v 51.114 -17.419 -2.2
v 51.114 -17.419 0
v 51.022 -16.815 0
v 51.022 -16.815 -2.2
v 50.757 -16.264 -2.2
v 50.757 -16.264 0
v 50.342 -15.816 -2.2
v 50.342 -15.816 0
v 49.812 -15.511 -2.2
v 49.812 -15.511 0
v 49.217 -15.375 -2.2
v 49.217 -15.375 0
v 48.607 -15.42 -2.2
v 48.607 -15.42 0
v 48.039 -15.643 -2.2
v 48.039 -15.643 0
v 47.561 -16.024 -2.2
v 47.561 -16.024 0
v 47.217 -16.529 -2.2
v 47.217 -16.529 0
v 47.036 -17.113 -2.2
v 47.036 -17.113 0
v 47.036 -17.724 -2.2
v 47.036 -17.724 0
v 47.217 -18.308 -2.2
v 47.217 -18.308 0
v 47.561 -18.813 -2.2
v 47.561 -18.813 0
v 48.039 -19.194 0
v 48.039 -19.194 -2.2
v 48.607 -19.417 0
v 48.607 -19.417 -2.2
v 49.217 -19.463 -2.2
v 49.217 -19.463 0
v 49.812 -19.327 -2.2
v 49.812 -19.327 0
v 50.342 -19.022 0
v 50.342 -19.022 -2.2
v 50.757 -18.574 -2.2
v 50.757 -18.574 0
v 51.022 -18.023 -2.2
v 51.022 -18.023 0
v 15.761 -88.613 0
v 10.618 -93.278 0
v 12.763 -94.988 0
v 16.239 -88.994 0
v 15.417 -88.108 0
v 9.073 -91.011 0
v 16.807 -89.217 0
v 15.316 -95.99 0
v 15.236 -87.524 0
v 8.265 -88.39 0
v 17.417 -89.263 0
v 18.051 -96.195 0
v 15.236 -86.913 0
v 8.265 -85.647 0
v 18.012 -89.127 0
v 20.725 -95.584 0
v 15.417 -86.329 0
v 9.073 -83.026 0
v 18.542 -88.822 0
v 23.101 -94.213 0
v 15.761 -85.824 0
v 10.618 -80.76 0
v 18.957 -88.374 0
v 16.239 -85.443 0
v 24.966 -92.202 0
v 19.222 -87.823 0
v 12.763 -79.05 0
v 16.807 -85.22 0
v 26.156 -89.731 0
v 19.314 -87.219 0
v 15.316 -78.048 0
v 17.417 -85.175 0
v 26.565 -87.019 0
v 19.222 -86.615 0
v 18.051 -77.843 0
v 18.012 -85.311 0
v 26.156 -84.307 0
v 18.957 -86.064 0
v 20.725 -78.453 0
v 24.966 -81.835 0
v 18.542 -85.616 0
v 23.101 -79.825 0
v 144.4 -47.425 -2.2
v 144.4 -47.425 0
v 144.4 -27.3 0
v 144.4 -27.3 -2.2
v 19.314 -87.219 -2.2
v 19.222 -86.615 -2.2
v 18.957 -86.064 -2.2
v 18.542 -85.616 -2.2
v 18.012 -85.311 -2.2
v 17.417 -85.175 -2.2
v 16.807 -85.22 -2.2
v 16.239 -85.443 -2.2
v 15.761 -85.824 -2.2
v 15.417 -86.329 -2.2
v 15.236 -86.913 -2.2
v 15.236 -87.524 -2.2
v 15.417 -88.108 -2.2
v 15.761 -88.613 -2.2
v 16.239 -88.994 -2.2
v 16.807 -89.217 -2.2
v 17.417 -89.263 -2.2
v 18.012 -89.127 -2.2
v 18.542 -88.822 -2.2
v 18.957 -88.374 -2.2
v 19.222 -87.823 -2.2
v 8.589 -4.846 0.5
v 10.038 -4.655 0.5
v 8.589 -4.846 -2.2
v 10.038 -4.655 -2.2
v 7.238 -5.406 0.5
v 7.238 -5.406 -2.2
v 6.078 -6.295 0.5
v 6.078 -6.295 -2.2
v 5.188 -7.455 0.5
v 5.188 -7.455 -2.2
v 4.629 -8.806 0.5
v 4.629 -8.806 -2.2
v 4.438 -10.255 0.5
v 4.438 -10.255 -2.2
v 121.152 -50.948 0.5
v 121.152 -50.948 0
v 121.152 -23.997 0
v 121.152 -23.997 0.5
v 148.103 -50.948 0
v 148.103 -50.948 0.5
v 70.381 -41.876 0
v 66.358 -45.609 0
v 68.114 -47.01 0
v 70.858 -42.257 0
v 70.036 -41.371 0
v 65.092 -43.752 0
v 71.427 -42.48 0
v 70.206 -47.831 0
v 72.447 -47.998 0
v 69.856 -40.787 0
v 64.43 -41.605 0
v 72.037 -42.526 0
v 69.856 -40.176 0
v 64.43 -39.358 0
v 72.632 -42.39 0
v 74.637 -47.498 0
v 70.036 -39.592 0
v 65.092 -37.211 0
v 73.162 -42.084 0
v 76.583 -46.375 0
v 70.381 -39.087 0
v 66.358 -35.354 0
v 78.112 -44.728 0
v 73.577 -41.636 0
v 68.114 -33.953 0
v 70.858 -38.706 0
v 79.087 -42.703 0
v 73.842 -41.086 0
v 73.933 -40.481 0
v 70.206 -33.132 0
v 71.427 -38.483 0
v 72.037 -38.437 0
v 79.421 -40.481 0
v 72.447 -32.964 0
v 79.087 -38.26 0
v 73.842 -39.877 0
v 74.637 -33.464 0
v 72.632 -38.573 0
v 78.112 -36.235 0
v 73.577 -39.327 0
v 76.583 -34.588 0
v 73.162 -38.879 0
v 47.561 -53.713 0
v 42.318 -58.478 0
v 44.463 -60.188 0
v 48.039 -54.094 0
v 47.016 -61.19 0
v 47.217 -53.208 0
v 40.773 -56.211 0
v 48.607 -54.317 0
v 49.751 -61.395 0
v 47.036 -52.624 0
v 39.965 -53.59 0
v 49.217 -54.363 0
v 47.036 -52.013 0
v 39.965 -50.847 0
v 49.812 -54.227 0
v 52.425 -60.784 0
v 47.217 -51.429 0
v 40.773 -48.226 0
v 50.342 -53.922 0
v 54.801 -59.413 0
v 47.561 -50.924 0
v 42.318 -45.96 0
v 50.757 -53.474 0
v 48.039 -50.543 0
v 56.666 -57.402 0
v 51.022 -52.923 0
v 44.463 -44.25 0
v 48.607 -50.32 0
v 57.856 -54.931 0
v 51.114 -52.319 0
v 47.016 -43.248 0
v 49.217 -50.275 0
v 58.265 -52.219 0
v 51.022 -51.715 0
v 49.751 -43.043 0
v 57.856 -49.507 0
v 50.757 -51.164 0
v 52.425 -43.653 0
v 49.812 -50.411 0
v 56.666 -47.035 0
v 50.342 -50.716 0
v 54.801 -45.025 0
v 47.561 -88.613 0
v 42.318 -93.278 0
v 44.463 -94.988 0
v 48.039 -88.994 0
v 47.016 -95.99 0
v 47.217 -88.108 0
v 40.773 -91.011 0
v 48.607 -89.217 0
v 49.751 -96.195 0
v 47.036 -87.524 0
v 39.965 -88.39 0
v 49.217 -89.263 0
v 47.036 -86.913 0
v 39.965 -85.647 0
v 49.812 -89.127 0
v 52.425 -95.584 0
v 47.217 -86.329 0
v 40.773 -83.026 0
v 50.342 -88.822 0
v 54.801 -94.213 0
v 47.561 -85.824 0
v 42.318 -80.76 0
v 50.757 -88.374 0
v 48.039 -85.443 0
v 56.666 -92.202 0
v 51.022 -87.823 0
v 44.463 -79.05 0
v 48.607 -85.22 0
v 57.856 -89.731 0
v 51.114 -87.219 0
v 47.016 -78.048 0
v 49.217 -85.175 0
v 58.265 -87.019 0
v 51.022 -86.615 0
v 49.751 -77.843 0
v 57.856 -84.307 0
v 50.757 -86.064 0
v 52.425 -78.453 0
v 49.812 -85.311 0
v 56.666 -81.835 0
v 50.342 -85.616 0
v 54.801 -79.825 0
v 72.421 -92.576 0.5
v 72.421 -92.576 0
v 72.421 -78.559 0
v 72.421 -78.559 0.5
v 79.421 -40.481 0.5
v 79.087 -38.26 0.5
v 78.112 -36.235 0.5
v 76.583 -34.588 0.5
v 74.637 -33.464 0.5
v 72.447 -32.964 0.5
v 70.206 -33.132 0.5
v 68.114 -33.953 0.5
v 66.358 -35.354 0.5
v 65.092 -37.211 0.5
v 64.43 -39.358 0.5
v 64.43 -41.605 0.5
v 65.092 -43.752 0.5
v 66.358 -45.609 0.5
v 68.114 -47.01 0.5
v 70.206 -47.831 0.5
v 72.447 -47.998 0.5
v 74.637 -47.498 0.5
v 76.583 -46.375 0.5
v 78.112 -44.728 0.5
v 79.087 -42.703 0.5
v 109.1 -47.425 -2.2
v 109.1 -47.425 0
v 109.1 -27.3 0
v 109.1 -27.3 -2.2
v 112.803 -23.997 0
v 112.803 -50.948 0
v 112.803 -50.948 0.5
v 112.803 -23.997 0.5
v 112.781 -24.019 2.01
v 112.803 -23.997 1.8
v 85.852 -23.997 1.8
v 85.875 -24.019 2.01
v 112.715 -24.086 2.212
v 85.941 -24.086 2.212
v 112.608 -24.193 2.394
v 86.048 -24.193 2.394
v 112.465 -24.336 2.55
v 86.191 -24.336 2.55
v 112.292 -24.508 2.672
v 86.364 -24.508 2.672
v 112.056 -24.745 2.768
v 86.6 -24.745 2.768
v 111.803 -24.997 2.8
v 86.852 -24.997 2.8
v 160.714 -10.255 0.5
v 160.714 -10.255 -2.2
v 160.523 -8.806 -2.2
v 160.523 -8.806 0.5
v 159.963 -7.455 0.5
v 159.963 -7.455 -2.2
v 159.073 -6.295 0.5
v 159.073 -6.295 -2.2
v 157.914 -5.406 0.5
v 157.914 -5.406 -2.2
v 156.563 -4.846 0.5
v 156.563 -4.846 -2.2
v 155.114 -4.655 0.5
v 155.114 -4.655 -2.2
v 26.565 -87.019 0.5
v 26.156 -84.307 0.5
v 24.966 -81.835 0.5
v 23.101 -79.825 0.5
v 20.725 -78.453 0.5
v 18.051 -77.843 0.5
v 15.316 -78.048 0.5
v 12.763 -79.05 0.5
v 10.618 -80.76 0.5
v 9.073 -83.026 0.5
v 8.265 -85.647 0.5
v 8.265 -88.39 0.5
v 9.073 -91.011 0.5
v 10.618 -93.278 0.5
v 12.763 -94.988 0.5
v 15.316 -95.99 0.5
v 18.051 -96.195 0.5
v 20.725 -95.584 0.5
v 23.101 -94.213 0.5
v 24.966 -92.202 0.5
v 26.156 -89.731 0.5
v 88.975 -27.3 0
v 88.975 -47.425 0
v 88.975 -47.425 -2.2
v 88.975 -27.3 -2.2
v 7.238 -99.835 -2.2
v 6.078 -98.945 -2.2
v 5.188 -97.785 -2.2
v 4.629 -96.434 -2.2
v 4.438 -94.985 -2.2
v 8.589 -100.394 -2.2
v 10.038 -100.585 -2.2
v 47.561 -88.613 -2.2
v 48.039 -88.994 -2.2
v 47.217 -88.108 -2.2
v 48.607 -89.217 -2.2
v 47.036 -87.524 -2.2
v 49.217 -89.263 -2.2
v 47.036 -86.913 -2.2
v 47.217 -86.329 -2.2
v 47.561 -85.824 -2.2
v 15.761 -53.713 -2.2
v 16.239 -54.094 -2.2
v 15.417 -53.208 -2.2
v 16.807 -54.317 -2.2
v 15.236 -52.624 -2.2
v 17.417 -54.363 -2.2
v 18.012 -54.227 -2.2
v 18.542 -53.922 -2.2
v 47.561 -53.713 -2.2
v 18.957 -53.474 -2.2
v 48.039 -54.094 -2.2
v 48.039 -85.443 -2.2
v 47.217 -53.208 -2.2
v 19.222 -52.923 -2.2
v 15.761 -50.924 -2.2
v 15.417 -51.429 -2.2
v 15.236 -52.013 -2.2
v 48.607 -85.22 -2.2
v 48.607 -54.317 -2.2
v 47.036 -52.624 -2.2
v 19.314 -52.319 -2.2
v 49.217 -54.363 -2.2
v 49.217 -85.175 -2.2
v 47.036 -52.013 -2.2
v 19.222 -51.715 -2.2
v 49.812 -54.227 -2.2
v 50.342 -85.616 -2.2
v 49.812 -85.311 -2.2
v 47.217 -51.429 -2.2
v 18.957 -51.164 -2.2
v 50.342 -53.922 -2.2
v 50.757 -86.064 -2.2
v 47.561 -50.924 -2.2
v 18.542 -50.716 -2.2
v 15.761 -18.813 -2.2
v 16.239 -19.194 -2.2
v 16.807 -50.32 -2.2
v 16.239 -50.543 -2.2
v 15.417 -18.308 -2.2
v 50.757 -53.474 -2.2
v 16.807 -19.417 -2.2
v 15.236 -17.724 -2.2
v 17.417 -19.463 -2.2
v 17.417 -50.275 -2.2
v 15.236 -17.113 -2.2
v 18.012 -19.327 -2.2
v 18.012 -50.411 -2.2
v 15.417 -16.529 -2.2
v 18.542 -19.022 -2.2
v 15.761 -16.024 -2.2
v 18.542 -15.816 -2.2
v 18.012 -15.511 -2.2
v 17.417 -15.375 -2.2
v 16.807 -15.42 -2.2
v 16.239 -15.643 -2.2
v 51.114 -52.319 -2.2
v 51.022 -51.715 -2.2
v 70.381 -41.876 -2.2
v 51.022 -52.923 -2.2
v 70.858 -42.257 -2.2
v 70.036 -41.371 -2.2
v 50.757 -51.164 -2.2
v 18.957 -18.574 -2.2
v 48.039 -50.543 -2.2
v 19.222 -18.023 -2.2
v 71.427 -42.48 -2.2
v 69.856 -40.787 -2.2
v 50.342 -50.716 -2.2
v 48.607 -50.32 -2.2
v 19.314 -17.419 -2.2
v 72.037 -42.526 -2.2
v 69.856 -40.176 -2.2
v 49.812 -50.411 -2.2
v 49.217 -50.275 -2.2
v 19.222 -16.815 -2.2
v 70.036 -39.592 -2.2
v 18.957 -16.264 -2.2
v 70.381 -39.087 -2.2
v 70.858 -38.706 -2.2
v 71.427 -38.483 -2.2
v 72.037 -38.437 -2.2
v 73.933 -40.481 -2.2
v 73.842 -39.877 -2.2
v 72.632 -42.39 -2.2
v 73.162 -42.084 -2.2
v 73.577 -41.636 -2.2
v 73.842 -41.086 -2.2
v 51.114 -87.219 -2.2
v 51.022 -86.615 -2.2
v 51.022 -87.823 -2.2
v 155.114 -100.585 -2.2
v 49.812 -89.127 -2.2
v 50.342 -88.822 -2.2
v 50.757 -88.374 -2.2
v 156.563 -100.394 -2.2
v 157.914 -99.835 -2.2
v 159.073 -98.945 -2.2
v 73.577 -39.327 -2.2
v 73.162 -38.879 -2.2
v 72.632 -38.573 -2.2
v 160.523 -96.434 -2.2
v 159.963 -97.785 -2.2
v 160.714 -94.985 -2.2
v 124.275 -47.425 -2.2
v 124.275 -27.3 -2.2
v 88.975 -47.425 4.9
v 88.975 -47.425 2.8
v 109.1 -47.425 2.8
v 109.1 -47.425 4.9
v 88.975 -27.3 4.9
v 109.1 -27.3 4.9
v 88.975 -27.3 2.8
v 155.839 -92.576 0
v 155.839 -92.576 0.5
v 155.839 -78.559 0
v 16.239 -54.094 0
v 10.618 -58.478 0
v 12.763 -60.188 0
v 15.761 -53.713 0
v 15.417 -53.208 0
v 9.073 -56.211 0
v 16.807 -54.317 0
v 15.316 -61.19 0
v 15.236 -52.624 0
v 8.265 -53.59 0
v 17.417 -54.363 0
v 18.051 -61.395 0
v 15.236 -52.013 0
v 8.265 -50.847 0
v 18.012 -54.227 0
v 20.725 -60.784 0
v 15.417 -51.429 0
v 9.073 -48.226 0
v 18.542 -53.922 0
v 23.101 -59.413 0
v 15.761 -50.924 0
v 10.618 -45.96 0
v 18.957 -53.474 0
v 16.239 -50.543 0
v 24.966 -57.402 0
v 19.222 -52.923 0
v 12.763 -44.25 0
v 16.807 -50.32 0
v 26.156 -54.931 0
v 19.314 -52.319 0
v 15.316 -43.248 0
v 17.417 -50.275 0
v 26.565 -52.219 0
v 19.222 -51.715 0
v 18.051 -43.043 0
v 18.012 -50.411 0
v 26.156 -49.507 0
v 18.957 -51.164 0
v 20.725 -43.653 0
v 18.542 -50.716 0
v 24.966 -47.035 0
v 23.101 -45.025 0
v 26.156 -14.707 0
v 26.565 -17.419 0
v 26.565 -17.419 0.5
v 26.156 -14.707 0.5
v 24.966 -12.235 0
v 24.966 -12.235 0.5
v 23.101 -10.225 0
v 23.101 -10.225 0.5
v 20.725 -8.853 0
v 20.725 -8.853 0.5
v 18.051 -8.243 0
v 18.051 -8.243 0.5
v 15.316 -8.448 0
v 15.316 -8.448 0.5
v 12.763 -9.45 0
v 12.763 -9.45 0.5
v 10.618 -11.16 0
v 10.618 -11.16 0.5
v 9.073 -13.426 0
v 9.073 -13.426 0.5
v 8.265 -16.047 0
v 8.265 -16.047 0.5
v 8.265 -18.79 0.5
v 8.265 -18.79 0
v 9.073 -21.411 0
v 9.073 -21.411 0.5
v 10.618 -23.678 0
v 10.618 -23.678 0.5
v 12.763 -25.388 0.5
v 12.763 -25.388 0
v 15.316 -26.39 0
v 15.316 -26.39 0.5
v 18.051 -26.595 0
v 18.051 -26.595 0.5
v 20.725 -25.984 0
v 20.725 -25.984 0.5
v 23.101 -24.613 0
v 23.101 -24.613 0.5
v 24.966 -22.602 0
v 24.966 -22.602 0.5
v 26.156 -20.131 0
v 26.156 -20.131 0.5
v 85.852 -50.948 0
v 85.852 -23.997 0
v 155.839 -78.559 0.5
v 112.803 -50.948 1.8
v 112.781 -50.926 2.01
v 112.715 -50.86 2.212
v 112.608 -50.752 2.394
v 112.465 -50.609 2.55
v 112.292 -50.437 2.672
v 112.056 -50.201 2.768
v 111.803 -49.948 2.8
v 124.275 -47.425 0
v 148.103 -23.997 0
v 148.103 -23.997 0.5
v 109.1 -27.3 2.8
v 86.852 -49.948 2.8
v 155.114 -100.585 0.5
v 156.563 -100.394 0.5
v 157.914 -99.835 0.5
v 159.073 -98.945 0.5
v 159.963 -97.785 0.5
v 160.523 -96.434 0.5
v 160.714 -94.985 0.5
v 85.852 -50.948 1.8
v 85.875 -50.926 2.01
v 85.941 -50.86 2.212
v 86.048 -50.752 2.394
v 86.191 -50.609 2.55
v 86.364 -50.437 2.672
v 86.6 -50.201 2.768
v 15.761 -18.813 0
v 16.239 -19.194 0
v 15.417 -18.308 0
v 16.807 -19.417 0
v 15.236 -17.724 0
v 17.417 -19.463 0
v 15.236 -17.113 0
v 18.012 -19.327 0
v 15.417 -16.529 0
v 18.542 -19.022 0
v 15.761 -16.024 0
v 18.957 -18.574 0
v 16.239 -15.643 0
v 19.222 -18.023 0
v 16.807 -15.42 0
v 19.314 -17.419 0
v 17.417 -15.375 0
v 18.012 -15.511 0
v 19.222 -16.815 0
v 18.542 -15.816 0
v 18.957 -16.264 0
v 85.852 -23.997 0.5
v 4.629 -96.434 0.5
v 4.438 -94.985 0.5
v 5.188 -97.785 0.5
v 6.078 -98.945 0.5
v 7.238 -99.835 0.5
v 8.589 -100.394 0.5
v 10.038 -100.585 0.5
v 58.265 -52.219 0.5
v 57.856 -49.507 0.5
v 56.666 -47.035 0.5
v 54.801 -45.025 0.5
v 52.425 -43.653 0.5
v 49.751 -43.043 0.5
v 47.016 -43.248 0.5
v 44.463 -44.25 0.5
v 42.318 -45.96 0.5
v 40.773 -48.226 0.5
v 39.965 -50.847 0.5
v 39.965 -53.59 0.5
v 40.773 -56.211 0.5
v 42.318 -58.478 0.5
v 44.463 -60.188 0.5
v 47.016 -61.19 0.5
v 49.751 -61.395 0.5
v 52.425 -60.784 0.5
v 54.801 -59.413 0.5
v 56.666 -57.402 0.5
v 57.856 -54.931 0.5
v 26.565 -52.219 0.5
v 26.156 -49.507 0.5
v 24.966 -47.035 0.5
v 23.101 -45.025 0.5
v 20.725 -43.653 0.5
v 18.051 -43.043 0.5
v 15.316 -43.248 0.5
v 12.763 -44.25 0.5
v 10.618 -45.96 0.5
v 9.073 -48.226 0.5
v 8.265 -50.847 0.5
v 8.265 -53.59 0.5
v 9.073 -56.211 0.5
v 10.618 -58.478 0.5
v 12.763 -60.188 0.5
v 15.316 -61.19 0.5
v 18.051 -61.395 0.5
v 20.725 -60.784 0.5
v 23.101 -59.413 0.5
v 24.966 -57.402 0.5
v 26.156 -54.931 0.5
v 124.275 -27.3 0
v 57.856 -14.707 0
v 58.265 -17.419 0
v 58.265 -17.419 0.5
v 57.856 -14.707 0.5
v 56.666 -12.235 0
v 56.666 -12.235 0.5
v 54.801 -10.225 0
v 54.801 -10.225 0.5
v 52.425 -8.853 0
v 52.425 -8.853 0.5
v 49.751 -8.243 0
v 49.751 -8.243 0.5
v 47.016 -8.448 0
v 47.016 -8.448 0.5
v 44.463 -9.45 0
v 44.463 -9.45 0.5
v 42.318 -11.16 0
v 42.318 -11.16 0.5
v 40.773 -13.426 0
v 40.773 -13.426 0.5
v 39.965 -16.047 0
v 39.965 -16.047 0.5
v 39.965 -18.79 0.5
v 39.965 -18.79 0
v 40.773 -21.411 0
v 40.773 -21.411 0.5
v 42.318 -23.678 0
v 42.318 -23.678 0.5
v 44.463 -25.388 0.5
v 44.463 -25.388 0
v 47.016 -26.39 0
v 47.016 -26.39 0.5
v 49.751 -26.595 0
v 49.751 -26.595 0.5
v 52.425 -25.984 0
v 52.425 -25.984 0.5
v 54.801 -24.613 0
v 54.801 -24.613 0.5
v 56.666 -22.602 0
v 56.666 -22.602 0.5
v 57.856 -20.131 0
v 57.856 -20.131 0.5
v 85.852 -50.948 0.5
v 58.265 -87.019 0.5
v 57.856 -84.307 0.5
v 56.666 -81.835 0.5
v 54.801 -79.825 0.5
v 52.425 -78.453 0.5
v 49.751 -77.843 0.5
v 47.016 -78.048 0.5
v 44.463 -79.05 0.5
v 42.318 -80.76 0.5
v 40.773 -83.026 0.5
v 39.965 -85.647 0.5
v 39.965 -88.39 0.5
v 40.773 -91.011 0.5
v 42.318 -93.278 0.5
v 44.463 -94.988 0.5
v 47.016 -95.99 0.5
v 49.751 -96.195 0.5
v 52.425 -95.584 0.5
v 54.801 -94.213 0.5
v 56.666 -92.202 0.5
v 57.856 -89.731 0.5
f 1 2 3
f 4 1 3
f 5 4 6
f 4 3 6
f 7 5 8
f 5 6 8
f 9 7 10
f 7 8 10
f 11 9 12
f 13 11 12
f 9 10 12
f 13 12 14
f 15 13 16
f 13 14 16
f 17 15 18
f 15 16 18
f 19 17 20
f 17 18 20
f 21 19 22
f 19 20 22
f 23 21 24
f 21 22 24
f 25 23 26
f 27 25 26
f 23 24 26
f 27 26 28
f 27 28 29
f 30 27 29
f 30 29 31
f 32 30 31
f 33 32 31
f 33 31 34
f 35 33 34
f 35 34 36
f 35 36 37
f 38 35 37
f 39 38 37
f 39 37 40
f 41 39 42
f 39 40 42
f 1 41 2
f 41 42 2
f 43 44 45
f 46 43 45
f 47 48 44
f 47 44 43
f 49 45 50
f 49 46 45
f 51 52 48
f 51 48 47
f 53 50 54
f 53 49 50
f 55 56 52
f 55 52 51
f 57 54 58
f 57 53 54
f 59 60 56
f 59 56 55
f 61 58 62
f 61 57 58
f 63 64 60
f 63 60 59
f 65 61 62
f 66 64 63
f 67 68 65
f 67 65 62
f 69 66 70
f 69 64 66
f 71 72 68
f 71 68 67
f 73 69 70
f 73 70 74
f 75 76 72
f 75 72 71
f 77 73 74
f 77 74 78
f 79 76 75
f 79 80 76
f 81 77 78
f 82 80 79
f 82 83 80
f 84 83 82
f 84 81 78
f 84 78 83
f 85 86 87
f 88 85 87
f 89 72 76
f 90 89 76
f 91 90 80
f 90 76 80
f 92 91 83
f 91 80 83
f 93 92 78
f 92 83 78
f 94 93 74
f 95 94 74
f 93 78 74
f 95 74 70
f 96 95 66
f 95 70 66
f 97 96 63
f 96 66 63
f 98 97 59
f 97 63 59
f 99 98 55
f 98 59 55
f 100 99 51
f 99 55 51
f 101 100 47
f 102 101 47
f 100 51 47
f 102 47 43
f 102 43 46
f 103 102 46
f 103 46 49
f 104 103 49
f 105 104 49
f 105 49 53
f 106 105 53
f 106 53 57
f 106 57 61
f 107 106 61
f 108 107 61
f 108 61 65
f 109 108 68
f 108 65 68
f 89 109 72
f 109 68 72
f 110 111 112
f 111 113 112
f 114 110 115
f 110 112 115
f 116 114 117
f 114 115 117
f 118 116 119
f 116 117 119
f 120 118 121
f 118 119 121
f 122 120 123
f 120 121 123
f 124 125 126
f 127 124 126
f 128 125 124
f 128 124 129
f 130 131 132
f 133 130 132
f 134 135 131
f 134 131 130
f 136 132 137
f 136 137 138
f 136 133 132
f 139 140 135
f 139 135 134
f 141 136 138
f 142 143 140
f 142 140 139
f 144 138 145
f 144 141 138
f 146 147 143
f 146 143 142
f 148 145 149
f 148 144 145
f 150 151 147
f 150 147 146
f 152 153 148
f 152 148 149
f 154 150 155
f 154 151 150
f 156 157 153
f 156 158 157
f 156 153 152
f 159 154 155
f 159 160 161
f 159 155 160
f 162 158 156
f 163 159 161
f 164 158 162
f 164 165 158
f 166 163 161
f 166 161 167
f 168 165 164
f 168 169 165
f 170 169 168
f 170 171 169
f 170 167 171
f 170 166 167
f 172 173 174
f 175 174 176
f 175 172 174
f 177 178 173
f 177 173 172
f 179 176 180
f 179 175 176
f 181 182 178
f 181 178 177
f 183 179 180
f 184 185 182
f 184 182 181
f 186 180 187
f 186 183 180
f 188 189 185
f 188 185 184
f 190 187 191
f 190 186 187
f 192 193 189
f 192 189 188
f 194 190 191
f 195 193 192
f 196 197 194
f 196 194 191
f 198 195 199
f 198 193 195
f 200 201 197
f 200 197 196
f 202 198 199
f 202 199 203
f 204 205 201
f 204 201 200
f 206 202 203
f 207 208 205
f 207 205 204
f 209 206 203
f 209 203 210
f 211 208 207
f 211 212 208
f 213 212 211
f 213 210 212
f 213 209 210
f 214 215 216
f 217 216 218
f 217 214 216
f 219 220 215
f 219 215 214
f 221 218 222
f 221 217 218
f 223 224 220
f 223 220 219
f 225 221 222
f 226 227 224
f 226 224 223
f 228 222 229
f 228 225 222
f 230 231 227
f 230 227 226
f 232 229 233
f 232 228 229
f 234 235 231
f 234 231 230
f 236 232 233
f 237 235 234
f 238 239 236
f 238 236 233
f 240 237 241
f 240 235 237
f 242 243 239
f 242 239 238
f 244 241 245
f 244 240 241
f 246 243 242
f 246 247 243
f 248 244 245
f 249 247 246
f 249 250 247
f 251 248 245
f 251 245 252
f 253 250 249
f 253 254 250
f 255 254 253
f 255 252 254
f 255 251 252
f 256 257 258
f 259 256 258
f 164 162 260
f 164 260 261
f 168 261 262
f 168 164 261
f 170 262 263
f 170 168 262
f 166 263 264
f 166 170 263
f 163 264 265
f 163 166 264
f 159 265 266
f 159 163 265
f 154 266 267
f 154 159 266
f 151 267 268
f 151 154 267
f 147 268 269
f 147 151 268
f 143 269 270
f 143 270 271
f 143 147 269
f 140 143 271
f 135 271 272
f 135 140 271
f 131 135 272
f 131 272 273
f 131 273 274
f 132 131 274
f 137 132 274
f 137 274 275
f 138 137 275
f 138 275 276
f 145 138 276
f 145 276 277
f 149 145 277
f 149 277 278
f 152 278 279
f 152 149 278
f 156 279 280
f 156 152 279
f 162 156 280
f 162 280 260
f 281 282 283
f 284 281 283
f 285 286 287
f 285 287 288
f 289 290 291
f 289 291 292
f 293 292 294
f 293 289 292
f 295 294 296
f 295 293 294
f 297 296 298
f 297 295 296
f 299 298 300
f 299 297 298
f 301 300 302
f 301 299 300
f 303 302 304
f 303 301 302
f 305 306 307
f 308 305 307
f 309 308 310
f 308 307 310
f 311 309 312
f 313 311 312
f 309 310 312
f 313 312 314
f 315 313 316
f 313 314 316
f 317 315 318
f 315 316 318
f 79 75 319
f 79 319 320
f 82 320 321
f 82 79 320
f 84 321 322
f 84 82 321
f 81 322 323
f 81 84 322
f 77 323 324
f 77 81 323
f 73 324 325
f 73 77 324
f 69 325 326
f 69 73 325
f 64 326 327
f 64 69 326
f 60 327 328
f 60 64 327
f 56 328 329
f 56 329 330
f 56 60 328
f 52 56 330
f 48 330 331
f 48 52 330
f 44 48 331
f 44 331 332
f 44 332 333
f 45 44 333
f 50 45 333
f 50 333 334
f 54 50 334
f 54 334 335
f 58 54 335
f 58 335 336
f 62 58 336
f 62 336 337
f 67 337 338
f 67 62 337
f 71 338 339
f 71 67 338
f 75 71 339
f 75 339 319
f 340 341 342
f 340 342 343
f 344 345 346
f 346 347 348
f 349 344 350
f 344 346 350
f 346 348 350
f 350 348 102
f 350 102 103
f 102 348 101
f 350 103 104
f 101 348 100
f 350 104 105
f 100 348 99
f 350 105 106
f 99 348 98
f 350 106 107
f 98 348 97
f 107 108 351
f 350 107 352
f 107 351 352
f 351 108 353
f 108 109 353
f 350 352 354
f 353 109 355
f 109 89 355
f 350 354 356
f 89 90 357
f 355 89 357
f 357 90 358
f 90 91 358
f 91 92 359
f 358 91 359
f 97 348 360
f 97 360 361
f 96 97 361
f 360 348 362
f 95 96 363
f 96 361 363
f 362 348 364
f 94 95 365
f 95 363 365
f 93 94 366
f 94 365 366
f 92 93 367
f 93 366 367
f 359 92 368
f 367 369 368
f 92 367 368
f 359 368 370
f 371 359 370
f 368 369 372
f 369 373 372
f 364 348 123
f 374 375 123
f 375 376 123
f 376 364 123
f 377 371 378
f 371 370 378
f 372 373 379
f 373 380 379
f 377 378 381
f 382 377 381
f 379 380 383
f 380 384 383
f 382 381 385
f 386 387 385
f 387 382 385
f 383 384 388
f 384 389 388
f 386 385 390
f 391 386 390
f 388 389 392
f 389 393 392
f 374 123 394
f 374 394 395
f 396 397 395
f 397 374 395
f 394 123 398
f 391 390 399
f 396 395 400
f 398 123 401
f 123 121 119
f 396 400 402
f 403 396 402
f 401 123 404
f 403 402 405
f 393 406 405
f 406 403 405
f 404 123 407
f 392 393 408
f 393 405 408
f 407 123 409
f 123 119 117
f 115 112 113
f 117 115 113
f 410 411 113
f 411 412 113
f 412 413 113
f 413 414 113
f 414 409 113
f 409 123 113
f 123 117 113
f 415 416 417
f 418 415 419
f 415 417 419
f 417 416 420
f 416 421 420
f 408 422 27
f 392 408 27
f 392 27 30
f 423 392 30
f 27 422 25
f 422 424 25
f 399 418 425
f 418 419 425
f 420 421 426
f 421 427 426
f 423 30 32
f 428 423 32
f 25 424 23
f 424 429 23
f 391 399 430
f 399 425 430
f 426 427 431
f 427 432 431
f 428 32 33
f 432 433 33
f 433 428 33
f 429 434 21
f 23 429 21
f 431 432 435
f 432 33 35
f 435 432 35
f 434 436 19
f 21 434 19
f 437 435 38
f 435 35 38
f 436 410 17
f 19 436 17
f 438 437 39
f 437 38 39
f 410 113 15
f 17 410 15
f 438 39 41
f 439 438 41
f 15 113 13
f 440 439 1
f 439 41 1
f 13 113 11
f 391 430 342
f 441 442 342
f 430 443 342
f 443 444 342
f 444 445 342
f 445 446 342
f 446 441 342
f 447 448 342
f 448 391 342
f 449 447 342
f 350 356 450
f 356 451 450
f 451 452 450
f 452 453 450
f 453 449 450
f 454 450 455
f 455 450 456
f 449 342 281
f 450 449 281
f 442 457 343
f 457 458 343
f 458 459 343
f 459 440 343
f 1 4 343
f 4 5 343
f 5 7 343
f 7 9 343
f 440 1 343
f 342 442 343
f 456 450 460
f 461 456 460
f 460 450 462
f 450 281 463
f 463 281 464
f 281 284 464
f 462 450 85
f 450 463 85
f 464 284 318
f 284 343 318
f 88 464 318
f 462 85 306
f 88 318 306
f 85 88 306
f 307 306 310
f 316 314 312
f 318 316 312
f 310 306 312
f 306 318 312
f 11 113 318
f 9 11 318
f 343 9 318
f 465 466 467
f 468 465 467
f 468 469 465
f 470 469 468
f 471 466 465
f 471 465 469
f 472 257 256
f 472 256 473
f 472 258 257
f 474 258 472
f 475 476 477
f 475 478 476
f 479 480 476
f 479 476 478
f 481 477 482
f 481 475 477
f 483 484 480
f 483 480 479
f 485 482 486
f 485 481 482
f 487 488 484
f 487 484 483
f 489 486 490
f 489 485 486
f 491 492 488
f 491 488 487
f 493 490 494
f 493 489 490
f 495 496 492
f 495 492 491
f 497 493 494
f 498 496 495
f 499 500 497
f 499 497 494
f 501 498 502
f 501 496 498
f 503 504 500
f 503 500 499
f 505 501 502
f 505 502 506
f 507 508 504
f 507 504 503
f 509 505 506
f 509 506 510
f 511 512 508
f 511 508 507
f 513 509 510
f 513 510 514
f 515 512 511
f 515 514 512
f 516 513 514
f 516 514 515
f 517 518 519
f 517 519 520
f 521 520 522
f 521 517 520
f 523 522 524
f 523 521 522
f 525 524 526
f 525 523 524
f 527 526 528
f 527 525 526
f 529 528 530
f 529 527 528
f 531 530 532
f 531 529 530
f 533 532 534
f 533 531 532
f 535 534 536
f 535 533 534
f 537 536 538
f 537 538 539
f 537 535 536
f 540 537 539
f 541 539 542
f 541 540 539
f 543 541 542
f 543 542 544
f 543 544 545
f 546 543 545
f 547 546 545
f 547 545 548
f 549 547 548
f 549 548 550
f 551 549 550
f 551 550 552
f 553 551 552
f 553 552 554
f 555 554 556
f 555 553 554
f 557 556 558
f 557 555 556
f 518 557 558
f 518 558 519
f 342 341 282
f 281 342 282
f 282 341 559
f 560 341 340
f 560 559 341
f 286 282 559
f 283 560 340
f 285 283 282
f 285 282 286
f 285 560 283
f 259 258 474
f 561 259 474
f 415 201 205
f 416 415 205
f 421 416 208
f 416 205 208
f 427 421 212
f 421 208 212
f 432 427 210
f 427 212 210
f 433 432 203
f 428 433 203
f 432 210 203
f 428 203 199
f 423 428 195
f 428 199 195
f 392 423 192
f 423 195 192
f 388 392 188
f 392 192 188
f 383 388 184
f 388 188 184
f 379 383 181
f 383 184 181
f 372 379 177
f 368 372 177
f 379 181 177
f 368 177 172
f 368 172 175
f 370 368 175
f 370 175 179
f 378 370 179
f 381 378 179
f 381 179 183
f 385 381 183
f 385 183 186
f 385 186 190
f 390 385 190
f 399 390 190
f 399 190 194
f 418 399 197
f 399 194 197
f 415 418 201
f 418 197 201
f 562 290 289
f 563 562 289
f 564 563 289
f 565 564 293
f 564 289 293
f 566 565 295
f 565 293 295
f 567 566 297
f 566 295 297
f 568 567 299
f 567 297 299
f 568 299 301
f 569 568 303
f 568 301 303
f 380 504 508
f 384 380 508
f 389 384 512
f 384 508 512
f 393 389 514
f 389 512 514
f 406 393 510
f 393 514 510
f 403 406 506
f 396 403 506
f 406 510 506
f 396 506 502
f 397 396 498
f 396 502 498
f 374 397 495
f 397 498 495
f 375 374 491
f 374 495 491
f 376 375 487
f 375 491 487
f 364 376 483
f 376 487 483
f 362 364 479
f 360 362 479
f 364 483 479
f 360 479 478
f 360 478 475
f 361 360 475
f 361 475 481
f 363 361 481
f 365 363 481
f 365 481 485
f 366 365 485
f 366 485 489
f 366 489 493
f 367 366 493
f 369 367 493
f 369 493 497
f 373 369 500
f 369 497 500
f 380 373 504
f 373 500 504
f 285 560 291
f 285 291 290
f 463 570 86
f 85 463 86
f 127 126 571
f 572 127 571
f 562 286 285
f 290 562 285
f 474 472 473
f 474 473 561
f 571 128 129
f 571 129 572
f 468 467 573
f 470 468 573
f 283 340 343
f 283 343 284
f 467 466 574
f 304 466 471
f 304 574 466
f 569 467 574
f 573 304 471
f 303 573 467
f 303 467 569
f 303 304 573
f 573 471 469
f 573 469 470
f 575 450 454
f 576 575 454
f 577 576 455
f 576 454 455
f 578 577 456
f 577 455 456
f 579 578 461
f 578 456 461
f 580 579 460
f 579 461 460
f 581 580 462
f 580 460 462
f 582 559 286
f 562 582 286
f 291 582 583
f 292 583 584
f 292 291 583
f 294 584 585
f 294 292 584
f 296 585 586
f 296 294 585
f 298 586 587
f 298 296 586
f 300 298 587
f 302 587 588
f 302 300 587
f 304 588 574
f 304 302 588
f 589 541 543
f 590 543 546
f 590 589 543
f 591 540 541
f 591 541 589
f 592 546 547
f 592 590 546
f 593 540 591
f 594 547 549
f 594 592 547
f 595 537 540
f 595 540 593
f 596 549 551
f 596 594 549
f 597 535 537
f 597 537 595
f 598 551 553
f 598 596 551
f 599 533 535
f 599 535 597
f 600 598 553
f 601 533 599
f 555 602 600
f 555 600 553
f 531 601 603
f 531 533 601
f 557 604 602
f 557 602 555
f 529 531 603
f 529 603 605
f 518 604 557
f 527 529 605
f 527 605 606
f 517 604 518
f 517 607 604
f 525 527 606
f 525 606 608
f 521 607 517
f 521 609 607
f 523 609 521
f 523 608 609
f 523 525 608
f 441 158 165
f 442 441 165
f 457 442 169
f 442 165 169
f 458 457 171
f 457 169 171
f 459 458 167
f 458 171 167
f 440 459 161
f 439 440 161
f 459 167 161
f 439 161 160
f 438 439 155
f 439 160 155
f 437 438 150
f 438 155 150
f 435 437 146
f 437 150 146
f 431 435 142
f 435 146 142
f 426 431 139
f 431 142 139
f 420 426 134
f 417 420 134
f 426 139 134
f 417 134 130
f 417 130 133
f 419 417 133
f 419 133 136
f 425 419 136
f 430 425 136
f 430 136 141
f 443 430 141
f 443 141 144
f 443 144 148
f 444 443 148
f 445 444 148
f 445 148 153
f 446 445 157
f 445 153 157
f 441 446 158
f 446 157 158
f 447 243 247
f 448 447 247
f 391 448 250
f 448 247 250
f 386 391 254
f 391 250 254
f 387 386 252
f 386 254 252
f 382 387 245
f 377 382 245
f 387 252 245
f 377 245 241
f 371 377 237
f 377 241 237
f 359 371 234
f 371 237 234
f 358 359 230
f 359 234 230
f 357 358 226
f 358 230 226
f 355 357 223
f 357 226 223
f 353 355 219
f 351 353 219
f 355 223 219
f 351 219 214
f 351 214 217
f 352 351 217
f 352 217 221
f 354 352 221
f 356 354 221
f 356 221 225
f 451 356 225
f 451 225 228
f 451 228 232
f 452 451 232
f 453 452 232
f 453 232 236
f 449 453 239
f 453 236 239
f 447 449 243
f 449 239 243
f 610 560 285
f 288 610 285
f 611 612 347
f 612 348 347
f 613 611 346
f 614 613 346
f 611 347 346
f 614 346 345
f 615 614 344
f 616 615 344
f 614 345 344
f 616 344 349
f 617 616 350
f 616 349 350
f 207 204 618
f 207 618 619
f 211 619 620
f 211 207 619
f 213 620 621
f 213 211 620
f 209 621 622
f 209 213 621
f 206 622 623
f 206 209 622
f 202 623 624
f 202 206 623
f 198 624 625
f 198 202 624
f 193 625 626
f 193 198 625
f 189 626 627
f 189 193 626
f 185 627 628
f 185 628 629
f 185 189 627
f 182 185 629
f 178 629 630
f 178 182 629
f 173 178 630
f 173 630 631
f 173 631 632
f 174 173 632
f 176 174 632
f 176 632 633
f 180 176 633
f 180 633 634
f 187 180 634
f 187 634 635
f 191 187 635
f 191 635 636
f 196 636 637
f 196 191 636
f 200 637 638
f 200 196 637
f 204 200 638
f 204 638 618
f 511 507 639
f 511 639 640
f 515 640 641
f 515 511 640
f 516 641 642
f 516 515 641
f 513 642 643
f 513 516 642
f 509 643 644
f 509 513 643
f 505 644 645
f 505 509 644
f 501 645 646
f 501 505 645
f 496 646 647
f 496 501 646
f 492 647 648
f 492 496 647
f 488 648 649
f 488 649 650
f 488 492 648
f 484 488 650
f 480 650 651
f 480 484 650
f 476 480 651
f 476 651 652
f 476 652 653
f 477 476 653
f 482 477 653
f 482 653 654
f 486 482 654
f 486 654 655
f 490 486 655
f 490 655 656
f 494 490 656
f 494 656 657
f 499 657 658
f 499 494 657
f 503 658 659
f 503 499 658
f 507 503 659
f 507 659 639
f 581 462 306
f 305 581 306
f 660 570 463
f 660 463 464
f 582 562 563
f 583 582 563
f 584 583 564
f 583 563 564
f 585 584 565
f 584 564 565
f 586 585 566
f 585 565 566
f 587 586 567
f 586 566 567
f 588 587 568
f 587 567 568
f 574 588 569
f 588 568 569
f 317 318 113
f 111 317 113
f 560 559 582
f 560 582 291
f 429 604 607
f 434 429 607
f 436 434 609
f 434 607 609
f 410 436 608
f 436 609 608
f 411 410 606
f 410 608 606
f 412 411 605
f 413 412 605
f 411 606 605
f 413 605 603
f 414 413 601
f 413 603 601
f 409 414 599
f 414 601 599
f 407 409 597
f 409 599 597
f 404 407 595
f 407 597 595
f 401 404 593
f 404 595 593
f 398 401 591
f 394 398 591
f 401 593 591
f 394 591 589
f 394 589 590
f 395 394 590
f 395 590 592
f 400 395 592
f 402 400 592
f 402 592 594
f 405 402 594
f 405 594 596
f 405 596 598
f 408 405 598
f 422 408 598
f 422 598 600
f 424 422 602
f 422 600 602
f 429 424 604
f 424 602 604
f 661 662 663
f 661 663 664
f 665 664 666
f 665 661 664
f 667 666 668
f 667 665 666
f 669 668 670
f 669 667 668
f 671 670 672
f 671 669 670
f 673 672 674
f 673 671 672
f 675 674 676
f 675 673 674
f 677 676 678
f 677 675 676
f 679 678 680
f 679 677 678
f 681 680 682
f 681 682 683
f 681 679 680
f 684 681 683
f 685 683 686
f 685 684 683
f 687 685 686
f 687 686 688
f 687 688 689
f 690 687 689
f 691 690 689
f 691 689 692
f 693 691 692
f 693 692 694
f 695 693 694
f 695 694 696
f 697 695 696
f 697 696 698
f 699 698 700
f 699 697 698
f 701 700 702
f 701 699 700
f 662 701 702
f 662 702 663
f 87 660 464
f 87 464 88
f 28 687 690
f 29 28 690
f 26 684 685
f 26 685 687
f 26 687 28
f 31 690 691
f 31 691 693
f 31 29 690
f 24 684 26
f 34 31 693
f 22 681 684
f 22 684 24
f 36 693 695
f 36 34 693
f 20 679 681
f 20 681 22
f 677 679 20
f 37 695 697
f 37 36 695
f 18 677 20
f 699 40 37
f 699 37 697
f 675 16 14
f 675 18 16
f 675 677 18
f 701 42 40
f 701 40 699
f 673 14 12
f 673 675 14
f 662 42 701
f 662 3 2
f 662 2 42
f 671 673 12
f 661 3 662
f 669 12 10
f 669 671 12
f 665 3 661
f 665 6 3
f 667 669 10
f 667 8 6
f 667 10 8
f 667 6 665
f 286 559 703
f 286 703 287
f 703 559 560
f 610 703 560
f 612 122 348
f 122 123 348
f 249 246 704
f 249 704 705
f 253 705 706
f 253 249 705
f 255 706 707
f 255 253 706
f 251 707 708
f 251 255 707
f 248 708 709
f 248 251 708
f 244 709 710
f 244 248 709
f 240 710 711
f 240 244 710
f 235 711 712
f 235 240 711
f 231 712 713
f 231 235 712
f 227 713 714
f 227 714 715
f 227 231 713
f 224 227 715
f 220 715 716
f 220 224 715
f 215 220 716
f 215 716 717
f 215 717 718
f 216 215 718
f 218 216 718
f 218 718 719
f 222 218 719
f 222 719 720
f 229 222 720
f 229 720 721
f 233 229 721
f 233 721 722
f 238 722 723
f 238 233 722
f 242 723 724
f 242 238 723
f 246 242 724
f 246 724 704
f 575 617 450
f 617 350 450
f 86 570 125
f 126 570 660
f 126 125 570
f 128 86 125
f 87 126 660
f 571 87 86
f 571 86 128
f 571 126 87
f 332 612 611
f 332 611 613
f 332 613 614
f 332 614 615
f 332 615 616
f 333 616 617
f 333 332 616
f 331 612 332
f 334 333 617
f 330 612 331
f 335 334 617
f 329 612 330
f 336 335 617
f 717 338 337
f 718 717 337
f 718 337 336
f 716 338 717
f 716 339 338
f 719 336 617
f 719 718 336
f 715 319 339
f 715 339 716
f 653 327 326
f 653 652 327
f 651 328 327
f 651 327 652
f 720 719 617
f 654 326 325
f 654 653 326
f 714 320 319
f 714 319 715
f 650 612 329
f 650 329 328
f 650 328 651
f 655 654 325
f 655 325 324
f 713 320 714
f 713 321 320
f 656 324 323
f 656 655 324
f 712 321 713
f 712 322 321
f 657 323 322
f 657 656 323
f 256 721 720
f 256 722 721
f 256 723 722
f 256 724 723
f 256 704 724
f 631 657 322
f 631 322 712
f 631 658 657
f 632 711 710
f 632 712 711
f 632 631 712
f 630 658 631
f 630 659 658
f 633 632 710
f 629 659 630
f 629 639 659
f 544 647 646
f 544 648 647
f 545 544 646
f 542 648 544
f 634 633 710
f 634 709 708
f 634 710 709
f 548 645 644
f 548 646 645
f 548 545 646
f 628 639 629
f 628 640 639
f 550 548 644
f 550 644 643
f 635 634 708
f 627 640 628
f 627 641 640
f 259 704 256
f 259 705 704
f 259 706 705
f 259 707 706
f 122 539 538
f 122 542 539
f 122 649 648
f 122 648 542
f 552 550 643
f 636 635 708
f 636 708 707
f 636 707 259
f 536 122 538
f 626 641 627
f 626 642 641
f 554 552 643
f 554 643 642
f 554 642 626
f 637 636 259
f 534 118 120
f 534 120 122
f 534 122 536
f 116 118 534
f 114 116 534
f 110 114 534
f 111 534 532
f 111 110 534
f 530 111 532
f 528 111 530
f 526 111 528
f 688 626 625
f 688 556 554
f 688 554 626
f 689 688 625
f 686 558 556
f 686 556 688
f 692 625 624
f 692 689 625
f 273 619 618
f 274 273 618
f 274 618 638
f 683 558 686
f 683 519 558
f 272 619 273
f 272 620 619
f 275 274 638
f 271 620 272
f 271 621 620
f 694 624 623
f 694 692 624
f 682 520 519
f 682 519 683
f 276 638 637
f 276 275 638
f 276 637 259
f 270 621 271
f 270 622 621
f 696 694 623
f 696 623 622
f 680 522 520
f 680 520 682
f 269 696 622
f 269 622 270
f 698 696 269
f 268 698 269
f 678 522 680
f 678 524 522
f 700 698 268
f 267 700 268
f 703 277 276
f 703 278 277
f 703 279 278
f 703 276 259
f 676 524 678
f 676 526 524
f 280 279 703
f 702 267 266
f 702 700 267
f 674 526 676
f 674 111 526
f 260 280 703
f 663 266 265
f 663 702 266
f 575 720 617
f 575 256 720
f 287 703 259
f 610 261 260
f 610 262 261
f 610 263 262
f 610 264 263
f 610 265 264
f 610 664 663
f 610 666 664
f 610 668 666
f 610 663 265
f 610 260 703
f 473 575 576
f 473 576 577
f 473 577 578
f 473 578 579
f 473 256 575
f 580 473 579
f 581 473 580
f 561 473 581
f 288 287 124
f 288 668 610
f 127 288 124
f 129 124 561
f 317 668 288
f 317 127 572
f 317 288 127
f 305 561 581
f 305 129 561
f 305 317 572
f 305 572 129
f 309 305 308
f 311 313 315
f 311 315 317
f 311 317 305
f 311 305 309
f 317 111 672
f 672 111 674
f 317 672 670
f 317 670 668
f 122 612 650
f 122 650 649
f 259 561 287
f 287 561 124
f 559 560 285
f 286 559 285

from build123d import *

# Parameters (mm, degrees)
F0_W     = 149.275535468
F0_H     = 88.9295647983
F0_R     = 9.2017219818
F0_W_2   = 83.4177359939
F0_H_2   = 14.016918838
F0_R_2   = 7.5380629756
F0_W_3   = 26.9511193037
F0_H_3   = 26.9511193037
F0_R_3   = 2.05
F0_W_4   = 20.125
F0_H_4   = 20.125
F1_DEPTH = 2.2
F2_DEPTH = 0.5
F3_DEPTH = 2.8
F4_R     = 1
F5_DEPTH = 4.9


with BuildPart() as f1:
    # F0 (on Top) → F1 (new body)
    with BuildSketch(Plane.XY):
        with BuildLine():
            Line((155.1135683298, -4.6552774664), (10.0380328618, -4.6552774664))
            ThreePointArc((10.0380328618, -4.6552774664), (6.0782348872, -6.2954794918), (4.4380328618, -10.2552774664))
            Line((4.4380328618, -10.2552774664), (4.4380328618, -94.9848422647))
            ThreePointArc((4.4380328618, -94.9848422647), (6.0782348872, -98.9446402393), (10.0380328618, -100.5848422647))
            Line((10.0380328618, -100.5848422647), (155.1135683298, -100.5848422647))
            ThreePointArc((155.1135683298, -100.5848422647), (159.0733663045, -98.9446402393), (160.7135683298, -94.9848422647))
            Line((160.7135683298, -94.9848422647), (160.7135683298, -10.2552774664))
            ThreePointArc((160.7135683298, -10.2552774664), (159.0733663045, -6.2954794918), (155.1135683298, -4.6552774664))
        make_face()
        with Locations((82.5758005958, -52.6200598655)):
            Rectangle(F0_W, F0_H, mode=Mode.SUBTRACT)
        with Locations((82.5758005958, -52.6200598655)):
            Rectangle(F0_W, F0_H)
        with Locations((17.3635222559, -87.018850666)):
            Circle(F0_R, mode=Mode.SUBTRACT)
        with Locations((49.0635222559, -87.018850666)):
            Circle(F0_R, mode=Mode.SUBTRACT)
        with Locations((114.1299642622, -85.567753762)):
            Rectangle(F0_W_2, F0_H_2, mode=Mode.SUBTRACT)
        with Locations((17.3635222559, -52.218850666)):
            Circle(F0_R, mode=Mode.SUBTRACT)
        with Locations((49.0635222559, -52.218850666)):
            Circle(F0_R, mode=Mode.SUBTRACT)
        with Locations((71.8833981295, -40.4814398784)):
            Circle(F0_R_2, mode=Mode.SUBTRACT)
        with Locations((17.3635222559, -17.418850666)):
            Circle(F0_R, mode=Mode.SUBTRACT)
        with Locations((49.0635222559, -17.418850666)):
            Circle(F0_R, mode=Mode.SUBTRACT)
        with Locations((99.3279069662, -37.4725610018)):
            Rectangle(F0_W_3, F0_H_3, mode=Mode.SUBTRACT)
        with Locations((134.6279069662, -37.4725610018)):
            Rectangle(F0_W_3, F0_H_3, mode=Mode.SUBTRACT)
        with Locations((17.3635222559, -17.418850666)):
            Circle(F0_R)
        with Locations((17.2635222559, -17.418850666)):
            Circle(F0_R_3, mode=Mode.SUBTRACT)
        with Locations((17.3635222559, -52.218850666)):
            Circle(F0_R)
        with Locations((17.2635222559, -52.318850666)):
            Circle(F0_R_3, mode=Mode.SUBTRACT)
        with Locations((17.3635222559, -87.018850666)):
            Circle(F0_R)
        with Locations((17.2635222559, -87.218850666)):
            Circle(F0_R_3, mode=Mode.SUBTRACT)
        with Locations((49.0635222559, -87.018850666)):
            Circle(F0_R)
        with Locations((49.0635222559, -87.218850666)):
            Circle(F0_R_3, mode=Mode.SUBTRACT)
        with Locations((49.0635222559, -52.218850666)):
            Circle(F0_R)
        with Locations((49.0635222559, -52.318850666)):
            Circle(F0_R_3, mode=Mode.SUBTRACT)
        with Locations((49.0635222559, -17.418850666)):
            Circle(F0_R)
        with Locations((49.0635222559, -17.418850666)):
            Circle(F0_R_3, mode=Mode.SUBTRACT)
        with Locations((71.8833981295, -40.4814398784)):
            Circle(F0_R_2)
        with Locations((71.8833981295, -40.4814398784)):
            Circle(F0_R_3, mode=Mode.SUBTRACT)
        with Locations((114.1299642622, -85.567753762)):
            Rectangle(F0_W_2, F0_H_2)
        with Locations((99.3279069662, -37.4725610018)):
            Rectangle(F0_W_3, F0_H_3)
        with Locations((99.0379891396, -37.3623677492)):
            Rectangle(F0_W_4, F0_H_4, mode=Mode.SUBTRACT)
        with Locations((134.6279069662, -37.4725610018)):
            Rectangle(F0_W_3, F0_H_3)
        with Locations((134.3379891396, -37.3623677492)):
            Rectangle(F0_W_4, F0_H_4, mode=Mode.SUBTRACT)
    extrude(amount=-F1_DEPTH)

    # F0 (on Top) → F2 (join)
    with BuildSketch(Plane.XY):
        with BuildLine():
            Line((155.1135683298, -4.6552774664), (10.0380328618, -4.6552774664))
            ThreePointArc((10.0380328618, -4.6552774664), (6.0782348872, -6.2954794918), (4.4380328618, -10.2552774664))
            Line((4.4380328618, -10.2552774664), (4.4380328618, -94.9848422647))
            ThreePointArc((4.4380328618, -94.9848422647), (6.0782348872, -98.9446402393), (10.0380328618, -100.5848422647))
            Line((10.0380328618, -100.5848422647), (155.1135683298, -100.5848422647))
            ThreePointArc((155.1135683298, -100.5848422647), (159.0733663045, -98.9446402393), (160.7135683298, -94.9848422647))
            Line((160.7135683298, -94.9848422647), (160.7135683298, -10.2552774664))
            ThreePointArc((160.7135683298, -10.2552774664), (159.0733663045, -6.2954794918), (155.1135683298, -4.6552774664))
        make_face()
        with Locations((82.5758005958, -52.6200598655)):
            Rectangle(F0_W, F0_H, mode=Mode.SUBTRACT)
        with Locations((82.5758005958, -52.6200598655)):
            Rectangle(F0_W, F0_H)
        with Locations((17.3635222559, -87.018850666)):
            Circle(F0_R, mode=Mode.SUBTRACT)
        with Locations((49.0635222559, -87.018850666)):
            Circle(F0_R, mode=Mode.SUBTRACT)
        with Locations((114.1299642622, -85.567753762)):
            Rectangle(F0_W_2, F0_H_2, mode=Mode.SUBTRACT)
        with Locations((17.3635222559, -52.218850666)):
            Circle(F0_R, mode=Mode.SUBTRACT)
        with Locations((49.0635222559, -52.218850666)):
            Circle(F0_R, mode=Mode.SUBTRACT)
        with Locations((71.8833981295, -40.4814398784)):
            Circle(F0_R_2, mode=Mode.SUBTRACT)
        with Locations((17.3635222559, -17.418850666)):
            Circle(F0_R, mode=Mode.SUBTRACT)
        with Locations((49.0635222559, -17.418850666)):
            Circle(F0_R, mode=Mode.SUBTRACT)
        with Locations((99.3279069662, -37.4725610018)):
            Rectangle(F0_W_3, F0_H_3, mode=Mode.SUBTRACT)
        with Locations((134.6279069662, -37.4725610018)):
            Rectangle(F0_W_3, F0_H_3, mode=Mode.SUBTRACT)
    extrude(amount=F2_DEPTH)


with BuildPart() as f3:
    # F0 (on Top) → F3 (new body)
    with BuildSketch(Plane.XY):
        with Locations((99.3279069662, -37.4725610018)):
            Rectangle(F0_W_3, F0_H_3)
        with Locations((99.0379891396, -37.3623677492)):
            Rectangle(F0_W_4, F0_H_4, mode=Mode.SUBTRACT)
    extrude(amount=F3_DEPTH)

    # F4
    f4_edges = [f3.edges().sort_by_distance(p)[0] for p in [
        (99.327907, -50.948121, 2.8),
        (85.852347, -37.472561, 2.8),
        (99.327907, -23.997001, 2.8),
        (112.803467, -37.472561, 2.8),
    ]]
    fillet(f4_edges, radius=F4_R)

    # F0 (on Top) → F5 (join)
    with BuildSketch(Plane.XY):
        with Locations((99.0379891396, -37.3623677492)):
            Rectangle(F0_W_4, F0_H_4)
    extrude(amount=F5_DEPTH)


solid = Compound([f1.part, f3.part])
